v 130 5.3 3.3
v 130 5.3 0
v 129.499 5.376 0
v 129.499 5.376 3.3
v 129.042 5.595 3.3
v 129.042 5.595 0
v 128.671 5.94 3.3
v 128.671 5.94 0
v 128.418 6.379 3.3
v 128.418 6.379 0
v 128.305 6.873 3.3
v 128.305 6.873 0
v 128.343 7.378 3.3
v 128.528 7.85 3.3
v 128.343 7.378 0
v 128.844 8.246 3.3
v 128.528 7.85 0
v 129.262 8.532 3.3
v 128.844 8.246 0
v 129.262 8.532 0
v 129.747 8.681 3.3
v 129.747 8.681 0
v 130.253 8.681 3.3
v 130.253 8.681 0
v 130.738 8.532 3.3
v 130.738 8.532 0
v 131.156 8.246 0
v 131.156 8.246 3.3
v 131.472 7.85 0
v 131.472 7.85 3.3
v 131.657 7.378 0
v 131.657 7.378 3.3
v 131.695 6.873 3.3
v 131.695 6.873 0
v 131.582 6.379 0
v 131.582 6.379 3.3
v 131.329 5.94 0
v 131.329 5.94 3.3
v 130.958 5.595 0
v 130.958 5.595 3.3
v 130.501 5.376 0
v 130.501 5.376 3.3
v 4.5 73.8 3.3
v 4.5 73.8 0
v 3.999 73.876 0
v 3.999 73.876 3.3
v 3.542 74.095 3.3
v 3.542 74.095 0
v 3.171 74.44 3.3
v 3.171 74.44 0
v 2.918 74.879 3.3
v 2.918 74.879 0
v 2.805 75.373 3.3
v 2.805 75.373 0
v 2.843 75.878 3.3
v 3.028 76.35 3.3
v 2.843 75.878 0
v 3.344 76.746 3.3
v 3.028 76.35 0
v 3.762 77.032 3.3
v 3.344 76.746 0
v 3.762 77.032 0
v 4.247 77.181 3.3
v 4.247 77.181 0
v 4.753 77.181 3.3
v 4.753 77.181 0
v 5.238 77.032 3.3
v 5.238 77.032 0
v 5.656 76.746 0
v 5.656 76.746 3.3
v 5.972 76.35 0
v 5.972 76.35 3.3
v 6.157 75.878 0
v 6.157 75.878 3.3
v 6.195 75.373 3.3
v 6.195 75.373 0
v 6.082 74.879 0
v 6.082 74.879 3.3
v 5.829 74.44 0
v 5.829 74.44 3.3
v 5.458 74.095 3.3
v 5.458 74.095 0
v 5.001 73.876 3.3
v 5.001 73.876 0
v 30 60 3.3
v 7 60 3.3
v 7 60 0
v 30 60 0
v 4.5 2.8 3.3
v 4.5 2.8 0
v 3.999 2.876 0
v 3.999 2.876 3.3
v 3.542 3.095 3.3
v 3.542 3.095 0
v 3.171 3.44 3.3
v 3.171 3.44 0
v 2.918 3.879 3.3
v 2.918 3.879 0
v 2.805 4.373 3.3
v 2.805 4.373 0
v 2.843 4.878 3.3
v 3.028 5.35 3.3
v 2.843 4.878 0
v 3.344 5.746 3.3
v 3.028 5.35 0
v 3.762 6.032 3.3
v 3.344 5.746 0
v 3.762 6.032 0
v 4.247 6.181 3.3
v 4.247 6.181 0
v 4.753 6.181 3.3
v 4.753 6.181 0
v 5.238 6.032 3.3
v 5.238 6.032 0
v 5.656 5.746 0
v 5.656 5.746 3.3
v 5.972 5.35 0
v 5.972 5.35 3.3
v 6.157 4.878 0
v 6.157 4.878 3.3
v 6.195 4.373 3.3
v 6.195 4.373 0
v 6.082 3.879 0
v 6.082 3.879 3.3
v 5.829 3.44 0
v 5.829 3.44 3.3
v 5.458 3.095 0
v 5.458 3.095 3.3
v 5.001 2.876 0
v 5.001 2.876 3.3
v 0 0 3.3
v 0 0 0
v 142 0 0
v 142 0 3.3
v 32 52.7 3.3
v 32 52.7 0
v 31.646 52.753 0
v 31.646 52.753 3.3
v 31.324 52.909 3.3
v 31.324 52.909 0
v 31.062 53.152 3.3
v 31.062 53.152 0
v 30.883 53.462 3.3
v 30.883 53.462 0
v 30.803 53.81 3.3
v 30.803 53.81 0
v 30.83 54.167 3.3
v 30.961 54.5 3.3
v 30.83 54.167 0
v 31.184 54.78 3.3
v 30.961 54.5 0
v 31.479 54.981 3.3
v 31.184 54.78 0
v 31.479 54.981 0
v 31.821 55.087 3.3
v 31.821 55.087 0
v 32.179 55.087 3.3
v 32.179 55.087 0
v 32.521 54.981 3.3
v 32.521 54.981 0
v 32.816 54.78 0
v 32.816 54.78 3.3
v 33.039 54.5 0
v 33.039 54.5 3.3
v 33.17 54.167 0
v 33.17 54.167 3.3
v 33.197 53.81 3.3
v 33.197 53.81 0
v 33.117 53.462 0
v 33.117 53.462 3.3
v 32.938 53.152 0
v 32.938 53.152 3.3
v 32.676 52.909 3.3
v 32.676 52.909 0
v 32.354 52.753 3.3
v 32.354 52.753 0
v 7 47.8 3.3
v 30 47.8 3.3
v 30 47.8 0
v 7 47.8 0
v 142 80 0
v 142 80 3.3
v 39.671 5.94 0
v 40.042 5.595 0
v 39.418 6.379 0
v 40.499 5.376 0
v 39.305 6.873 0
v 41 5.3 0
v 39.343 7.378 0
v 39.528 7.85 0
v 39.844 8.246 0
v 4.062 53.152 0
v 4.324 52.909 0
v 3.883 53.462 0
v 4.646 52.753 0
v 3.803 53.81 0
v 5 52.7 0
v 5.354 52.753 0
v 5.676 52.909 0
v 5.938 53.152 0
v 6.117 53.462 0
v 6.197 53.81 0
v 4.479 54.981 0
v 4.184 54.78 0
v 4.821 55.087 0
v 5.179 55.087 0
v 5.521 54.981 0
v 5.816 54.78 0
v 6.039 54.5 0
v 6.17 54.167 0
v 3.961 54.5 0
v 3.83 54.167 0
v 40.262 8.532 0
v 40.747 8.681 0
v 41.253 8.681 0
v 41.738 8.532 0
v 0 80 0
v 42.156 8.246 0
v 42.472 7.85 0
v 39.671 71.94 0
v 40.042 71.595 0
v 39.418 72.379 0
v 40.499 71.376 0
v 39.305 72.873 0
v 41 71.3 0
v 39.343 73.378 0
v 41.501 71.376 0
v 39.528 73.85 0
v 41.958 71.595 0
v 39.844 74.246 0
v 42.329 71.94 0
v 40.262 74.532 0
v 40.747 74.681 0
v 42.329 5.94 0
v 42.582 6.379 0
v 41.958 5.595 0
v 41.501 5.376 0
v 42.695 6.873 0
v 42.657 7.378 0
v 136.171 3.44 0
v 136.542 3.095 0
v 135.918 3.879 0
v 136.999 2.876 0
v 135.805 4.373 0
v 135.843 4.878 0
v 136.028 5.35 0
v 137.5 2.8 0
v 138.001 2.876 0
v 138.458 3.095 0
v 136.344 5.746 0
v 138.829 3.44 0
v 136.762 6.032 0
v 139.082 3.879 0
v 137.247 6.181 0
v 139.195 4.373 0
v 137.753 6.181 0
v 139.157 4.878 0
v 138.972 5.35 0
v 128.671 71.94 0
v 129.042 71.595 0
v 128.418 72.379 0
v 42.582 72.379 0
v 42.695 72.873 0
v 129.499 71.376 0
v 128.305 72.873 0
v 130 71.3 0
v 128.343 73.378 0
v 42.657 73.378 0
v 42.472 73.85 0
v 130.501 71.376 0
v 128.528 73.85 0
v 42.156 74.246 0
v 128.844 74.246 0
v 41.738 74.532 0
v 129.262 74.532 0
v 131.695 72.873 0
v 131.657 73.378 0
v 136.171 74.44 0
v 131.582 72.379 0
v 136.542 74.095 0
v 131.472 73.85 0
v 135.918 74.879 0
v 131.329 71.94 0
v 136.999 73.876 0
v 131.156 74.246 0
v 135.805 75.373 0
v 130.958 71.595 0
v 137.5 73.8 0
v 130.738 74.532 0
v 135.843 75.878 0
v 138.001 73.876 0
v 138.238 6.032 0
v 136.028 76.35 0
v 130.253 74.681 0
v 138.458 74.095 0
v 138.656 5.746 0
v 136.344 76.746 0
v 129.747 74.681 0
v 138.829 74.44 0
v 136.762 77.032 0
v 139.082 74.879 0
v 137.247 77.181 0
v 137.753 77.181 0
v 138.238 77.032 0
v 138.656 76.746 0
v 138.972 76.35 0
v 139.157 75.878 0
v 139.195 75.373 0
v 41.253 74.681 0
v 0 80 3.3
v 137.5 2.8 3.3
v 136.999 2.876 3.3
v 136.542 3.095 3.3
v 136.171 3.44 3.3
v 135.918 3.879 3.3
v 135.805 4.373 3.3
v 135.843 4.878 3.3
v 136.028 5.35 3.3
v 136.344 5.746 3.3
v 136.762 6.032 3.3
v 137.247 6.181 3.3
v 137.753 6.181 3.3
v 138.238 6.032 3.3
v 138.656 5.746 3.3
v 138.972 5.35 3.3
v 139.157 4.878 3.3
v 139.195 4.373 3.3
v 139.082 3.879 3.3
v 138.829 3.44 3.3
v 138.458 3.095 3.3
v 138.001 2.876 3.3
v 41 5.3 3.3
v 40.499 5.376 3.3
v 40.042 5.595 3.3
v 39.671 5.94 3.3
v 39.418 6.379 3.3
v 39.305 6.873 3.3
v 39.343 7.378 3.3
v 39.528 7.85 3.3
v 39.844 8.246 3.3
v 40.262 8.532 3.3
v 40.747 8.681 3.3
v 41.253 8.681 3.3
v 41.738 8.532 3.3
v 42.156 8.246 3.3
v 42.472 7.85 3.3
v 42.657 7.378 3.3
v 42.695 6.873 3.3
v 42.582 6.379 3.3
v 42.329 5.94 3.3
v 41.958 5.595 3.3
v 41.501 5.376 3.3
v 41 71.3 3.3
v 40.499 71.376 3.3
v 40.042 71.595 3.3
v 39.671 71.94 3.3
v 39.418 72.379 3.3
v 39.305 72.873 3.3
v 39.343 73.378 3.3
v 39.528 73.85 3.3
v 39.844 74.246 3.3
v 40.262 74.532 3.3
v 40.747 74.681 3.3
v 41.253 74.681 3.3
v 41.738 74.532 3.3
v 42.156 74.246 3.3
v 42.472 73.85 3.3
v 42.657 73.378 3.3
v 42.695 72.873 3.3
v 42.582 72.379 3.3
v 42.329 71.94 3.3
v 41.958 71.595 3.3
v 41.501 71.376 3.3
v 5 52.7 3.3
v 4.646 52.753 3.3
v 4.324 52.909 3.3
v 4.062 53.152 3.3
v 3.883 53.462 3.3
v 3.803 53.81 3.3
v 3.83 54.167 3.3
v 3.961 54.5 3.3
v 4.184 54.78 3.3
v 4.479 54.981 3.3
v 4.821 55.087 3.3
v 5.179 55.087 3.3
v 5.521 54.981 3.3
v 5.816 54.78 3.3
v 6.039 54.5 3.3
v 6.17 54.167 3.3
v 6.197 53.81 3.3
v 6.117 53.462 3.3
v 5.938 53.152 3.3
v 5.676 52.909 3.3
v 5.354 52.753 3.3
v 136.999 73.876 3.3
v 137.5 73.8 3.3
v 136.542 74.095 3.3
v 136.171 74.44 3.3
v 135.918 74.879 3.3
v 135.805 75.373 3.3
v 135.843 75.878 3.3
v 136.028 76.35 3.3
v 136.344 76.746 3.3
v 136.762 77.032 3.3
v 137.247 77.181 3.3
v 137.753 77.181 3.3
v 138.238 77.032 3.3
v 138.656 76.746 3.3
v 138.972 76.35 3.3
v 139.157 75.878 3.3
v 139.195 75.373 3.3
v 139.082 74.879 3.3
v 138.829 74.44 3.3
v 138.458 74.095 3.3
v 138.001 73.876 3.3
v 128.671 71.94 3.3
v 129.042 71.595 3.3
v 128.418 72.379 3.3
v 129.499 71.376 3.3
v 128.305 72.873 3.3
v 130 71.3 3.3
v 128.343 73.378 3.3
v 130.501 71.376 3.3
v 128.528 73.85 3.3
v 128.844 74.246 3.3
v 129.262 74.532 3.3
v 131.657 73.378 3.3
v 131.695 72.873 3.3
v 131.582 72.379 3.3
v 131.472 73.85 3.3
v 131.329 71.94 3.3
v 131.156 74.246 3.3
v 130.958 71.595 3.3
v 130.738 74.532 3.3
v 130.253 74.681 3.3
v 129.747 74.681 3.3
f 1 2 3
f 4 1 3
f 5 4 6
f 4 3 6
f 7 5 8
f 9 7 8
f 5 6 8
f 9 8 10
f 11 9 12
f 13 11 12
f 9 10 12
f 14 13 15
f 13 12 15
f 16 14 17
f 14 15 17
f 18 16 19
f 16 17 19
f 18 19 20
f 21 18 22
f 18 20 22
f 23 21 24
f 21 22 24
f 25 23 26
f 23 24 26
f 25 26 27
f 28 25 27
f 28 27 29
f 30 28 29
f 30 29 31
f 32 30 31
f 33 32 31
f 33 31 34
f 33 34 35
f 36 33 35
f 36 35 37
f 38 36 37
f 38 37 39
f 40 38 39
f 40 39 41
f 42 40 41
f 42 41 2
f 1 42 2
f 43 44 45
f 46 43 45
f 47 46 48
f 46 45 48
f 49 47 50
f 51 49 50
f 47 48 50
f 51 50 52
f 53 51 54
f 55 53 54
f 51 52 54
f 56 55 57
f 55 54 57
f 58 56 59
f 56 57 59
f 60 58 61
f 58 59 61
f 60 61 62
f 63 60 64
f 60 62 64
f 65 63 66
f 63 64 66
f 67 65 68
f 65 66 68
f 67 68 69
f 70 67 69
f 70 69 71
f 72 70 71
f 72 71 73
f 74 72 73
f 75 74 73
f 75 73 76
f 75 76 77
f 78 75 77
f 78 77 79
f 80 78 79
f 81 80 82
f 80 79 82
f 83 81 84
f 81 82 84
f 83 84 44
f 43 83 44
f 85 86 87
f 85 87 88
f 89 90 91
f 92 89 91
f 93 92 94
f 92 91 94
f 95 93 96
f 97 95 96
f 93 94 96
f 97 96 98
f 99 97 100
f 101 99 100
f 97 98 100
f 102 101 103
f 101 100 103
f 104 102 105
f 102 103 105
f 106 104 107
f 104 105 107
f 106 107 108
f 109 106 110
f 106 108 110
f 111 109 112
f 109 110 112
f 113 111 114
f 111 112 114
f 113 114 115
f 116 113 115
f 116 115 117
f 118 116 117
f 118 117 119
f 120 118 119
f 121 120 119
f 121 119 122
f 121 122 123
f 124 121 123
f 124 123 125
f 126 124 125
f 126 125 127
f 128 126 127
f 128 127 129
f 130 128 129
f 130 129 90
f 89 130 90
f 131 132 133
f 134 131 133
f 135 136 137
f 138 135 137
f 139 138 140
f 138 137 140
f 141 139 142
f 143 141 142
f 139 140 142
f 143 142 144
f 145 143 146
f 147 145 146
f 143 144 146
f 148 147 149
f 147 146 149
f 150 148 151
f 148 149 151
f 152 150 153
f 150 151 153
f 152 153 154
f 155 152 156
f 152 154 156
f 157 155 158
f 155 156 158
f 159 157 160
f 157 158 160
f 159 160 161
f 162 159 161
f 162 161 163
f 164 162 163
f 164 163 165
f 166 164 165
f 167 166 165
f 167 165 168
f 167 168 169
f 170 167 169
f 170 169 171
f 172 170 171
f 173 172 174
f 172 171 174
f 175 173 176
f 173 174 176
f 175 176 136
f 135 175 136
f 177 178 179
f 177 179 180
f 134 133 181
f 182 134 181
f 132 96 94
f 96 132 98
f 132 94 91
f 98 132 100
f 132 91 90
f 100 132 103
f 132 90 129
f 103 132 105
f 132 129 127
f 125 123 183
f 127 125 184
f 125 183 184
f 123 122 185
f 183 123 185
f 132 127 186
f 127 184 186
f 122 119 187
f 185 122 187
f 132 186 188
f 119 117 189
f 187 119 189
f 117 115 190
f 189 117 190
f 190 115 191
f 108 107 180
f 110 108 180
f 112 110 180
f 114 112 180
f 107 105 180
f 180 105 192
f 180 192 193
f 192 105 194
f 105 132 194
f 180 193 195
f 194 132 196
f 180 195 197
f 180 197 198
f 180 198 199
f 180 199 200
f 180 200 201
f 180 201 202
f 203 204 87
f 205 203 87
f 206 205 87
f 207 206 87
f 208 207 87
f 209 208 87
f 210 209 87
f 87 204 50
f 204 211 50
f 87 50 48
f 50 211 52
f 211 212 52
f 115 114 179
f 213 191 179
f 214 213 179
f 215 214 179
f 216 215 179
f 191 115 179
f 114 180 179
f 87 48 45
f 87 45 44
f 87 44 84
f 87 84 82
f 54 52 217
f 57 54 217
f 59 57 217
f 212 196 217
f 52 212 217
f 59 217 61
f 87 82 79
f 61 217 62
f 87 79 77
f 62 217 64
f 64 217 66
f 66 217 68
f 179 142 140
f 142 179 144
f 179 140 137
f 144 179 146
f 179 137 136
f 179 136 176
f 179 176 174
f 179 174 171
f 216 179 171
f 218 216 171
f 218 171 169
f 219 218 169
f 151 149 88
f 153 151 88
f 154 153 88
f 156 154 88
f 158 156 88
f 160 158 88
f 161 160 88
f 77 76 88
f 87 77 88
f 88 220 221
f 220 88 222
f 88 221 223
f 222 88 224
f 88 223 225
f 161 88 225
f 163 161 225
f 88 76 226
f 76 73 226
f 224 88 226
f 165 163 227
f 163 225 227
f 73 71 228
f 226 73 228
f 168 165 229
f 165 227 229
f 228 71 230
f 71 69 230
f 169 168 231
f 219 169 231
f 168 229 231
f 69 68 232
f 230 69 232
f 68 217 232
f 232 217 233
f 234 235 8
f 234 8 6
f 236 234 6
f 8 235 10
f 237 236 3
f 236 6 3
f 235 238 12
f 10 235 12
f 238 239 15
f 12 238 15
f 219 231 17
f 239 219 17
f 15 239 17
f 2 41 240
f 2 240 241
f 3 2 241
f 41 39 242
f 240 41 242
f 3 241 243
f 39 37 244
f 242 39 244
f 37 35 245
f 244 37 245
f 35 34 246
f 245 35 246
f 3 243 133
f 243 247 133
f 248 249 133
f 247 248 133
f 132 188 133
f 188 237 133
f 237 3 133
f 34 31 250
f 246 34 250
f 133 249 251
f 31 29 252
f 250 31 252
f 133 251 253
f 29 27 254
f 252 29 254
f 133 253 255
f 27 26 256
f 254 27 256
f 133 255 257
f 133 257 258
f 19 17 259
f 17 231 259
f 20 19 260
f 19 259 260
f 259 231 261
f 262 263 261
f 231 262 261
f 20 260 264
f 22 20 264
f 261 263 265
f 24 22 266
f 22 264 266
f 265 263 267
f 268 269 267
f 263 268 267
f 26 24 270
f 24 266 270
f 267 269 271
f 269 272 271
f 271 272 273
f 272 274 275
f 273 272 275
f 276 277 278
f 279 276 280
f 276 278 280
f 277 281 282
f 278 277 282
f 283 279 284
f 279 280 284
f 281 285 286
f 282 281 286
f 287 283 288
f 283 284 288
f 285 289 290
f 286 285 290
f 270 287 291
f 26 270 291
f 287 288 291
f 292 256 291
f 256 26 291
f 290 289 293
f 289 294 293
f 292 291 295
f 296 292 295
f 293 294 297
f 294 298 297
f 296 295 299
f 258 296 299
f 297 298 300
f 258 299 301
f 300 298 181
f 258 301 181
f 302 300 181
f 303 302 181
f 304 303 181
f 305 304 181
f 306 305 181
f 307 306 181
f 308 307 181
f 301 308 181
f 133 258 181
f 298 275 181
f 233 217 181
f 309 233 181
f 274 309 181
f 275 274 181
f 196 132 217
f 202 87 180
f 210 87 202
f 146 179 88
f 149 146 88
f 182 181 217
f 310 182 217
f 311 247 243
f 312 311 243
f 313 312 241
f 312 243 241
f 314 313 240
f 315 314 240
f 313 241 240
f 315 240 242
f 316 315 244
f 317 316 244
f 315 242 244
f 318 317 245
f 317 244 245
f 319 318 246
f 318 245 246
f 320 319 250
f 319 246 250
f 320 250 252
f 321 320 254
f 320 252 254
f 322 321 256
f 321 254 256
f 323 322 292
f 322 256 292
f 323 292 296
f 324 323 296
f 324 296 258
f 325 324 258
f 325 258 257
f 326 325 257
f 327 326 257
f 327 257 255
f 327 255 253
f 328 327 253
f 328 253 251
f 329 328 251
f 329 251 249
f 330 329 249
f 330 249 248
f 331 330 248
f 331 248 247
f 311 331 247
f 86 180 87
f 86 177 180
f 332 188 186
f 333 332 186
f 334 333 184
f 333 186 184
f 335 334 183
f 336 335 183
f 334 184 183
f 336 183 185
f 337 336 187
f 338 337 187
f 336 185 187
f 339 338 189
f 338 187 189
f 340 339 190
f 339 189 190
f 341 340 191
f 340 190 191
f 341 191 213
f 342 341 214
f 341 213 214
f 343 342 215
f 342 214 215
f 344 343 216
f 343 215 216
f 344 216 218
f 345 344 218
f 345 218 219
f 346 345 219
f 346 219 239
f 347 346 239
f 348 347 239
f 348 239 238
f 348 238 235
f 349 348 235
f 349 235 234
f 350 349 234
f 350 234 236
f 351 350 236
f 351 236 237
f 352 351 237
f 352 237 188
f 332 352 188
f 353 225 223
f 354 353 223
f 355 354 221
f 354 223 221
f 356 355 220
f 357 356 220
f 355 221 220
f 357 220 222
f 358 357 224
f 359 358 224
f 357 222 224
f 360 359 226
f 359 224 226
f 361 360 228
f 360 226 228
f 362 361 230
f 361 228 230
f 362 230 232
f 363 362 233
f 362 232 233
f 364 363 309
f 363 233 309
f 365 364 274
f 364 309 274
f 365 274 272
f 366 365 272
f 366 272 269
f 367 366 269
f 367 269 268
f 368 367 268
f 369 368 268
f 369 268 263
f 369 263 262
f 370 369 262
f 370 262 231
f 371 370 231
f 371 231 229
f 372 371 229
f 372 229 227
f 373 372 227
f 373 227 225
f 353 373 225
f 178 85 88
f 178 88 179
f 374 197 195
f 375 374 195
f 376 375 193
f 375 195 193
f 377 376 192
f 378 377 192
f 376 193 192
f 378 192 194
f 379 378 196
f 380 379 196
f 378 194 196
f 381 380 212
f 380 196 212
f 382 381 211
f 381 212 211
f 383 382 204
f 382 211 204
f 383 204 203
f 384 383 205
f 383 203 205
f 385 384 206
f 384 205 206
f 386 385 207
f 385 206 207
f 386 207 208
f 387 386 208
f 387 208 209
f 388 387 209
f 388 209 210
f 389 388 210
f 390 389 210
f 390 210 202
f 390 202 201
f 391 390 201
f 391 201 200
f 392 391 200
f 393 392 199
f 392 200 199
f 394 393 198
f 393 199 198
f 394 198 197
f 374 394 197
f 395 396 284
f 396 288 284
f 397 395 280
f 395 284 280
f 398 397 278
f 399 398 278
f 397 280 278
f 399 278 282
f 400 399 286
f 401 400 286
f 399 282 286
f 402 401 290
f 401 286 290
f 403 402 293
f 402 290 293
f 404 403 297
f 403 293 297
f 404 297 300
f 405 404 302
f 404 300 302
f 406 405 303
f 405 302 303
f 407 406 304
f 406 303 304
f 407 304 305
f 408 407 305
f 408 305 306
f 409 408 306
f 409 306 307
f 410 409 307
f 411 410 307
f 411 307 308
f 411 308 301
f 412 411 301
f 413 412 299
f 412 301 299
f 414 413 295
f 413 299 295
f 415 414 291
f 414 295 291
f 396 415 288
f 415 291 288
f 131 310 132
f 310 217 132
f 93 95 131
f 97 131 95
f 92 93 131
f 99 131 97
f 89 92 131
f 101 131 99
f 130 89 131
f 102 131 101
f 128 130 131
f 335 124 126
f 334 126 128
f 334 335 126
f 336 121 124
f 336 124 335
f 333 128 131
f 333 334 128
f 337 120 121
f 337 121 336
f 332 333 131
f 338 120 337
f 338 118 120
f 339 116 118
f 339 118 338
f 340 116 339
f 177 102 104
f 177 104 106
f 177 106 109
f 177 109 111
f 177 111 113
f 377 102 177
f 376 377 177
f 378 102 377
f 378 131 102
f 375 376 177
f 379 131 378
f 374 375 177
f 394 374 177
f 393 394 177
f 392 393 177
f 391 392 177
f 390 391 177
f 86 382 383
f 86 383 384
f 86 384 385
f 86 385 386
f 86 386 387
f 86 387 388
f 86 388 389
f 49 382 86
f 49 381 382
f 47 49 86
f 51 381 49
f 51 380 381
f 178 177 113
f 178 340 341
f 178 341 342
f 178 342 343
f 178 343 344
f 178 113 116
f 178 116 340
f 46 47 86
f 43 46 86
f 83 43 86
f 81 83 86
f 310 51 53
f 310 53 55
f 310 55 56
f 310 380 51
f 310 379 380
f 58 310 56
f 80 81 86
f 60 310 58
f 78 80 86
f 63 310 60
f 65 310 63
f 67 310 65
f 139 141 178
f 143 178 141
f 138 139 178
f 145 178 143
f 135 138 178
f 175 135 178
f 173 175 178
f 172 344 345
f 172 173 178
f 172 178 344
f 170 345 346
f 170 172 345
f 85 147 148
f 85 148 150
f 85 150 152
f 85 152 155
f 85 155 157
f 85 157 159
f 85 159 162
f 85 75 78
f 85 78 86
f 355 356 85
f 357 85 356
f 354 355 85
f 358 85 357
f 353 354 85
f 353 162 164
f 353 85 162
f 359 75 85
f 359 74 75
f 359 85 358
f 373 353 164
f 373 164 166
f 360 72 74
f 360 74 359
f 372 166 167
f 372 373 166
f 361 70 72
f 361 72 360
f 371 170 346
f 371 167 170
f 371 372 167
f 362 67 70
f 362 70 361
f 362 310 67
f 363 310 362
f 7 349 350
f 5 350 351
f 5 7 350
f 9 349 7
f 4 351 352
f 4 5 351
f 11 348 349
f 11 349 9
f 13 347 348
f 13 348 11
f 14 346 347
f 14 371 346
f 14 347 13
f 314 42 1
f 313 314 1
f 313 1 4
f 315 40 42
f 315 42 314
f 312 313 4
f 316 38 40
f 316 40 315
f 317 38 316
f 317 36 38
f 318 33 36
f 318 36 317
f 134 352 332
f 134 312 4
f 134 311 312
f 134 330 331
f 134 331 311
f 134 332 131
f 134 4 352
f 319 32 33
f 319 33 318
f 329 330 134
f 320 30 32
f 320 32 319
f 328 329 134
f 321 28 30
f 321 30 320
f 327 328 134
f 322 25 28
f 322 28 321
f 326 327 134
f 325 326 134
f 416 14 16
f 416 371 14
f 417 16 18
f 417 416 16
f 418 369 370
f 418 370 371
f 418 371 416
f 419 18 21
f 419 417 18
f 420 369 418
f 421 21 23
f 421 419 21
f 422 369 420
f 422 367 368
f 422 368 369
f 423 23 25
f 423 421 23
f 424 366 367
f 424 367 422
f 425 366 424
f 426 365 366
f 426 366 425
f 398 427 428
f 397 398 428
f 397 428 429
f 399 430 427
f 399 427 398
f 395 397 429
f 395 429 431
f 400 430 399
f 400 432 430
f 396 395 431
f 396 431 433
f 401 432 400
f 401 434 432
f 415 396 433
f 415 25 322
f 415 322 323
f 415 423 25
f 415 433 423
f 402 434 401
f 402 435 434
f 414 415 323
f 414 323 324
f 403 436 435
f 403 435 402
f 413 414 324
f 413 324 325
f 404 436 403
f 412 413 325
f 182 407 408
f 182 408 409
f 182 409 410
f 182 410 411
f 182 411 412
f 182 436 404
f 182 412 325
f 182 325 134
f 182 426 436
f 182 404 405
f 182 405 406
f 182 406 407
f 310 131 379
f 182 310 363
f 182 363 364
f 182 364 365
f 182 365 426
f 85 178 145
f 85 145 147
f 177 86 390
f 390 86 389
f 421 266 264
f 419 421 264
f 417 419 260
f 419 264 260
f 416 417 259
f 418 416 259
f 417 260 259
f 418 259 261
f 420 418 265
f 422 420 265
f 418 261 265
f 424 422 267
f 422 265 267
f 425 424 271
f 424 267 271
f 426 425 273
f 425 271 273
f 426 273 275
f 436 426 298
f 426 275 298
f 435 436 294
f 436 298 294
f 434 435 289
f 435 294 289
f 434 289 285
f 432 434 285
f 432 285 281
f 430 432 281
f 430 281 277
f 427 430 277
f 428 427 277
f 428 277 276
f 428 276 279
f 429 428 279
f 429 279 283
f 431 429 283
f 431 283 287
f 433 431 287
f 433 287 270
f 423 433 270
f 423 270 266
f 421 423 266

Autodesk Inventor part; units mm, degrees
ref_plane "YZ Plane" through (0, 0, 0) normal (1, 0, 0) x (0, 1, 0)
ref_plane "XZ Plane" through (0, 0, 0) normal (0, 1, 0) x (-1, 0, 0)
ref_plane "XY Plane" through (0, 0, 0) normal (0, 0, 1) x (1, 0, 0)
sketch "スケッチ1" plane through (0, 0, 0) normal (0, 0, 1) x (1, 0, 0)
  line L0 (0, 0) -> (142, 0)
  line L1 (142, 0) -> (142, 80)
  line L2 (142, 80) -> (0, 80)
  line L3 (0, 80) -> (0, 0)
  dimension "d40" = 142
  dimension "d41" = 80
extrude "押し出し1" add sketch "スケッチ1" along normal blind 3.3
hole "穴5" at (4.5, 75.5, 3.3) direction (0, 0, -1) diameter 3.4 end through all
hole "穴6" at (137.5, 75.5, 3.3) direction (0, 0, -1) diameter 3.4 end through all
hole "穴7" at (137.5, 4.5, 3.3) direction (0, 0, -1) diameter 3.4 end through all
hole "穴8" at (4.5, 4.5, 3.3) direction (0, 0, -1) diameter 3.4 end through all
hole "穴9" at (130, 73, 3.3) direction (0, 0, -1) diameter 3.4 end through all
hole "穴10" at (130, 7, 3.3) direction (0, 0, -1) diameter 3.4 end through all
hole "穴13" at (41, 73, 3.3) direction (0, 0, -1) diameter 3.4 end through all
hole "穴14" at (41, 7, 3.3) direction (0, 0, -1) diameter 3.4 end through all
sketch "スケッチ2" plane through (0, 0, 3.3) normal (0, 0, 1) x (1, 0, 0)
  line L0 (7, 60) -> (30, 60)
  line L1 (30, 60) -> (30, 47.8)
  line L2 (30, 47.8) -> (7, 47.8)
  line L3 (7, 47.8) -> (7, 60)
  point P0 (0, 0)
  dimension "d132" = 23
  dimension "d133" = 12.2
extrude "押し出し2" cut sketch "スケッチ2" against normal blind 10
hole "穴15" at (5, 53.9, 3.3) direction (0, 0, -1) diameter 2.4 end through all
hole "穴16" at (32, 53.9, 3.3) direction (0, 0, -1) diameter 2.4 end through all
properties part number "基本板上" material "アルミニウム 5052"
